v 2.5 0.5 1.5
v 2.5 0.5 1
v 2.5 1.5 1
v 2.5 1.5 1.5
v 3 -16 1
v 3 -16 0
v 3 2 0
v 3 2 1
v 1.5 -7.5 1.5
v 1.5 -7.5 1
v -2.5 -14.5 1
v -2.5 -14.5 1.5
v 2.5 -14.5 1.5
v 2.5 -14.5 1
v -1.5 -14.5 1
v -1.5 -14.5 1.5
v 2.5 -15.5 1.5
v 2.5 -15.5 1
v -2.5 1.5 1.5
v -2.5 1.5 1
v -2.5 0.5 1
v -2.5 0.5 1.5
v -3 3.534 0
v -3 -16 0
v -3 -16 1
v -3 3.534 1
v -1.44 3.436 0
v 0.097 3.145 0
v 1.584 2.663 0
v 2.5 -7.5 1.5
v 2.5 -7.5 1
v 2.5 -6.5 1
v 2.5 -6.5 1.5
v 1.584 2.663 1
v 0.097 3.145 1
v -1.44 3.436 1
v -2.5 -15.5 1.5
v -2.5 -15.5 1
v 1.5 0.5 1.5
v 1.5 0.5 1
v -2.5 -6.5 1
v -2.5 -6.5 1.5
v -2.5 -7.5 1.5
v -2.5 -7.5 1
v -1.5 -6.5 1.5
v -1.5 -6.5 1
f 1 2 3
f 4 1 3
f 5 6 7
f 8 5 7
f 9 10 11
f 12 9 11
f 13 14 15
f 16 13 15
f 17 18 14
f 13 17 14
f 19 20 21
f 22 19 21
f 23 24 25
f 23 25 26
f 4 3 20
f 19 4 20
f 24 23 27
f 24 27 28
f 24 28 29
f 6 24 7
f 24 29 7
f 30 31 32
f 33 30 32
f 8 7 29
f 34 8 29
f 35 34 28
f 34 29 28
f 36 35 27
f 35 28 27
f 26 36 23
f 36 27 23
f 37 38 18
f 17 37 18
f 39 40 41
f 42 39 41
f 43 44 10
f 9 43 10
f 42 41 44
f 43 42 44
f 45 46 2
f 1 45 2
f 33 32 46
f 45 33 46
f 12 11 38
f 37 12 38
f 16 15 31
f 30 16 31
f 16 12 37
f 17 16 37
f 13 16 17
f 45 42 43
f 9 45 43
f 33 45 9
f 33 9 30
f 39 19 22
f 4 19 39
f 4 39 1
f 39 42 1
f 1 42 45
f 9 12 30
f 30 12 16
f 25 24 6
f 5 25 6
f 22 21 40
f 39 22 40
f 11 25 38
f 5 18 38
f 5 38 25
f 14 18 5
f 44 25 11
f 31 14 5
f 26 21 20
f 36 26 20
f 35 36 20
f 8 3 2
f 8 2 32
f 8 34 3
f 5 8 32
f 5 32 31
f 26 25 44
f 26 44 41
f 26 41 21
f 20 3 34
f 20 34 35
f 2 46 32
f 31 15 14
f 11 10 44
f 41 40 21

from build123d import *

# Parameters (mm, degrees)
PAD_DEPTH    = 1
PAD001_DEPTH = 0.5


with BuildPart() as part:
    # Sketch → Pad (new body)
    with BuildSketch(Plane.XY):
        with BuildLine():
            Line((-3, -16), (3, -16))
            Line((3, -16), (3, 2))
            ThreePointArc((3, 2), (0.096514, 3.144536), (-3, 3.534144))
            Line((-3, -16), (-3, 3.534144))
        make_face()
    extrude(amount=PAD_DEPTH)

    # Sketch001 → Pad001 (new body)
    with BuildSketch(Plane.XY.offset(1)):
        Polygon((2.5, 1.5), (-2.5, 1.5), (-2.5, 0.5), (1.5, 0.5), (-2.5, -6.5), (-2.5, -7.5), (1.5, -7.5), (-2.5, -14.5), (-2.5, -15.5), (2.5, -15.5), (2.5, -14.5), (-1.5, -14.5), (2.5, -7.5), (2.5, -6.5), (-1.5, -6.5), (2.5, 0.5), align=None)
    extrude(amount=PAD001_DEPTH)


solid = part.part
